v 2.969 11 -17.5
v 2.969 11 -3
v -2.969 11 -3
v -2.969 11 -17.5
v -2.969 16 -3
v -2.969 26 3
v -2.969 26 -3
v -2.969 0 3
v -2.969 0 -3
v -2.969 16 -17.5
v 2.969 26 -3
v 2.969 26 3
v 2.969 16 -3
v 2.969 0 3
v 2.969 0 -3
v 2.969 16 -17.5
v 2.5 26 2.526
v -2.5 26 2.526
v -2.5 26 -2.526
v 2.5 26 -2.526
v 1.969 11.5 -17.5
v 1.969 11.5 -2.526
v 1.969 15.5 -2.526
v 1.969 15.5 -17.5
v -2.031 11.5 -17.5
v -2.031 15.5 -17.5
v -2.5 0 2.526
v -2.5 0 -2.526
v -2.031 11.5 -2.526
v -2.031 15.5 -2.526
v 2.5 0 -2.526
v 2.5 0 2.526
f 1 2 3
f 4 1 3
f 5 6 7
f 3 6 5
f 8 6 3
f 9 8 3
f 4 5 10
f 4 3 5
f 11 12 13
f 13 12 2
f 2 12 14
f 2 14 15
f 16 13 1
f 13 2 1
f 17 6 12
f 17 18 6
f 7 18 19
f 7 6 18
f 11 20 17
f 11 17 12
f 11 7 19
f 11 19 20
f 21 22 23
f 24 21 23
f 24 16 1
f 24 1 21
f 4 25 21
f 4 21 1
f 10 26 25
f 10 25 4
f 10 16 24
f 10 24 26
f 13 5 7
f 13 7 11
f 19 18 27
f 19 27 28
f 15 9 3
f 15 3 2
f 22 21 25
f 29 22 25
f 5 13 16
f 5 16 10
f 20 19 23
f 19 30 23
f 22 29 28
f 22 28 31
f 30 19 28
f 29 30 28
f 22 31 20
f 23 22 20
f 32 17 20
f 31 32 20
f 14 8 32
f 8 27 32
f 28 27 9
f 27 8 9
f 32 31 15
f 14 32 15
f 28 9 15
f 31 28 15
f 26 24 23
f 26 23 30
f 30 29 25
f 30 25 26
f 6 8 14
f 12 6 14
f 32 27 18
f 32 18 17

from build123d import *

# Parameters (mm, degrees)
SKETCH1_W           = 5.93875838
SKETCH1_H           = 6
SKETCH1_W_2         = 5
SKETCH1_H_2         = 5.051560964
BOSS_EXTRUDE1_DEPTH = 26
SKETCH4_W           = 5.93875838
SKETCH4_H           = 5
BOSS_EXTRUDE2_DEPTH = 14.5
SKETCH5_W           = 4
SKETCH5_H           = 4
CUT_EXTRUDE1_DEPTH  = 14.974219518


with BuildPart() as part:
    # Sketch1 → Boss-Extrude1 (new body)
    with BuildSketch(Plane(origin=(0, 0, 0), x_dir=(1, 0, 0), z_dir=(0, 1, 0))):
        Rectangle(SKETCH1_W, SKETCH1_H)
        Rectangle(SKETCH1_W_2, SKETCH1_H_2, mode=Mode.SUBTRACT)
    extrude(amount=BOSS_EXTRUDE1_DEPTH)

    # Sketch4 → Boss-Extrude2 (add)
    with BuildSketch(Plane(origin=(0, 0, -3), x_dir=(-1, 0, 0), z_dir=(0, 0, -1))):
        with Locations((0, 13.5)):
            Rectangle(SKETCH4_W, SKETCH4_H)
    extrude(amount=BOSS_EXTRUDE2_DEPTH)

    # Sketch5 → Cut-Extrude1 (cut)
    with BuildSketch(Plane(origin=(0, 0, -17.5), x_dir=(-1, 0, 0), z_dir=(0, 0, -1))):
        with Locations((0.03062081, 13.5)):
            Rectangle(SKETCH5_W, SKETCH5_H)
    extrude(amount=-CUT_EXTRUDE1_DEPTH, mode=Mode.SUBTRACT)


solid = part.part
